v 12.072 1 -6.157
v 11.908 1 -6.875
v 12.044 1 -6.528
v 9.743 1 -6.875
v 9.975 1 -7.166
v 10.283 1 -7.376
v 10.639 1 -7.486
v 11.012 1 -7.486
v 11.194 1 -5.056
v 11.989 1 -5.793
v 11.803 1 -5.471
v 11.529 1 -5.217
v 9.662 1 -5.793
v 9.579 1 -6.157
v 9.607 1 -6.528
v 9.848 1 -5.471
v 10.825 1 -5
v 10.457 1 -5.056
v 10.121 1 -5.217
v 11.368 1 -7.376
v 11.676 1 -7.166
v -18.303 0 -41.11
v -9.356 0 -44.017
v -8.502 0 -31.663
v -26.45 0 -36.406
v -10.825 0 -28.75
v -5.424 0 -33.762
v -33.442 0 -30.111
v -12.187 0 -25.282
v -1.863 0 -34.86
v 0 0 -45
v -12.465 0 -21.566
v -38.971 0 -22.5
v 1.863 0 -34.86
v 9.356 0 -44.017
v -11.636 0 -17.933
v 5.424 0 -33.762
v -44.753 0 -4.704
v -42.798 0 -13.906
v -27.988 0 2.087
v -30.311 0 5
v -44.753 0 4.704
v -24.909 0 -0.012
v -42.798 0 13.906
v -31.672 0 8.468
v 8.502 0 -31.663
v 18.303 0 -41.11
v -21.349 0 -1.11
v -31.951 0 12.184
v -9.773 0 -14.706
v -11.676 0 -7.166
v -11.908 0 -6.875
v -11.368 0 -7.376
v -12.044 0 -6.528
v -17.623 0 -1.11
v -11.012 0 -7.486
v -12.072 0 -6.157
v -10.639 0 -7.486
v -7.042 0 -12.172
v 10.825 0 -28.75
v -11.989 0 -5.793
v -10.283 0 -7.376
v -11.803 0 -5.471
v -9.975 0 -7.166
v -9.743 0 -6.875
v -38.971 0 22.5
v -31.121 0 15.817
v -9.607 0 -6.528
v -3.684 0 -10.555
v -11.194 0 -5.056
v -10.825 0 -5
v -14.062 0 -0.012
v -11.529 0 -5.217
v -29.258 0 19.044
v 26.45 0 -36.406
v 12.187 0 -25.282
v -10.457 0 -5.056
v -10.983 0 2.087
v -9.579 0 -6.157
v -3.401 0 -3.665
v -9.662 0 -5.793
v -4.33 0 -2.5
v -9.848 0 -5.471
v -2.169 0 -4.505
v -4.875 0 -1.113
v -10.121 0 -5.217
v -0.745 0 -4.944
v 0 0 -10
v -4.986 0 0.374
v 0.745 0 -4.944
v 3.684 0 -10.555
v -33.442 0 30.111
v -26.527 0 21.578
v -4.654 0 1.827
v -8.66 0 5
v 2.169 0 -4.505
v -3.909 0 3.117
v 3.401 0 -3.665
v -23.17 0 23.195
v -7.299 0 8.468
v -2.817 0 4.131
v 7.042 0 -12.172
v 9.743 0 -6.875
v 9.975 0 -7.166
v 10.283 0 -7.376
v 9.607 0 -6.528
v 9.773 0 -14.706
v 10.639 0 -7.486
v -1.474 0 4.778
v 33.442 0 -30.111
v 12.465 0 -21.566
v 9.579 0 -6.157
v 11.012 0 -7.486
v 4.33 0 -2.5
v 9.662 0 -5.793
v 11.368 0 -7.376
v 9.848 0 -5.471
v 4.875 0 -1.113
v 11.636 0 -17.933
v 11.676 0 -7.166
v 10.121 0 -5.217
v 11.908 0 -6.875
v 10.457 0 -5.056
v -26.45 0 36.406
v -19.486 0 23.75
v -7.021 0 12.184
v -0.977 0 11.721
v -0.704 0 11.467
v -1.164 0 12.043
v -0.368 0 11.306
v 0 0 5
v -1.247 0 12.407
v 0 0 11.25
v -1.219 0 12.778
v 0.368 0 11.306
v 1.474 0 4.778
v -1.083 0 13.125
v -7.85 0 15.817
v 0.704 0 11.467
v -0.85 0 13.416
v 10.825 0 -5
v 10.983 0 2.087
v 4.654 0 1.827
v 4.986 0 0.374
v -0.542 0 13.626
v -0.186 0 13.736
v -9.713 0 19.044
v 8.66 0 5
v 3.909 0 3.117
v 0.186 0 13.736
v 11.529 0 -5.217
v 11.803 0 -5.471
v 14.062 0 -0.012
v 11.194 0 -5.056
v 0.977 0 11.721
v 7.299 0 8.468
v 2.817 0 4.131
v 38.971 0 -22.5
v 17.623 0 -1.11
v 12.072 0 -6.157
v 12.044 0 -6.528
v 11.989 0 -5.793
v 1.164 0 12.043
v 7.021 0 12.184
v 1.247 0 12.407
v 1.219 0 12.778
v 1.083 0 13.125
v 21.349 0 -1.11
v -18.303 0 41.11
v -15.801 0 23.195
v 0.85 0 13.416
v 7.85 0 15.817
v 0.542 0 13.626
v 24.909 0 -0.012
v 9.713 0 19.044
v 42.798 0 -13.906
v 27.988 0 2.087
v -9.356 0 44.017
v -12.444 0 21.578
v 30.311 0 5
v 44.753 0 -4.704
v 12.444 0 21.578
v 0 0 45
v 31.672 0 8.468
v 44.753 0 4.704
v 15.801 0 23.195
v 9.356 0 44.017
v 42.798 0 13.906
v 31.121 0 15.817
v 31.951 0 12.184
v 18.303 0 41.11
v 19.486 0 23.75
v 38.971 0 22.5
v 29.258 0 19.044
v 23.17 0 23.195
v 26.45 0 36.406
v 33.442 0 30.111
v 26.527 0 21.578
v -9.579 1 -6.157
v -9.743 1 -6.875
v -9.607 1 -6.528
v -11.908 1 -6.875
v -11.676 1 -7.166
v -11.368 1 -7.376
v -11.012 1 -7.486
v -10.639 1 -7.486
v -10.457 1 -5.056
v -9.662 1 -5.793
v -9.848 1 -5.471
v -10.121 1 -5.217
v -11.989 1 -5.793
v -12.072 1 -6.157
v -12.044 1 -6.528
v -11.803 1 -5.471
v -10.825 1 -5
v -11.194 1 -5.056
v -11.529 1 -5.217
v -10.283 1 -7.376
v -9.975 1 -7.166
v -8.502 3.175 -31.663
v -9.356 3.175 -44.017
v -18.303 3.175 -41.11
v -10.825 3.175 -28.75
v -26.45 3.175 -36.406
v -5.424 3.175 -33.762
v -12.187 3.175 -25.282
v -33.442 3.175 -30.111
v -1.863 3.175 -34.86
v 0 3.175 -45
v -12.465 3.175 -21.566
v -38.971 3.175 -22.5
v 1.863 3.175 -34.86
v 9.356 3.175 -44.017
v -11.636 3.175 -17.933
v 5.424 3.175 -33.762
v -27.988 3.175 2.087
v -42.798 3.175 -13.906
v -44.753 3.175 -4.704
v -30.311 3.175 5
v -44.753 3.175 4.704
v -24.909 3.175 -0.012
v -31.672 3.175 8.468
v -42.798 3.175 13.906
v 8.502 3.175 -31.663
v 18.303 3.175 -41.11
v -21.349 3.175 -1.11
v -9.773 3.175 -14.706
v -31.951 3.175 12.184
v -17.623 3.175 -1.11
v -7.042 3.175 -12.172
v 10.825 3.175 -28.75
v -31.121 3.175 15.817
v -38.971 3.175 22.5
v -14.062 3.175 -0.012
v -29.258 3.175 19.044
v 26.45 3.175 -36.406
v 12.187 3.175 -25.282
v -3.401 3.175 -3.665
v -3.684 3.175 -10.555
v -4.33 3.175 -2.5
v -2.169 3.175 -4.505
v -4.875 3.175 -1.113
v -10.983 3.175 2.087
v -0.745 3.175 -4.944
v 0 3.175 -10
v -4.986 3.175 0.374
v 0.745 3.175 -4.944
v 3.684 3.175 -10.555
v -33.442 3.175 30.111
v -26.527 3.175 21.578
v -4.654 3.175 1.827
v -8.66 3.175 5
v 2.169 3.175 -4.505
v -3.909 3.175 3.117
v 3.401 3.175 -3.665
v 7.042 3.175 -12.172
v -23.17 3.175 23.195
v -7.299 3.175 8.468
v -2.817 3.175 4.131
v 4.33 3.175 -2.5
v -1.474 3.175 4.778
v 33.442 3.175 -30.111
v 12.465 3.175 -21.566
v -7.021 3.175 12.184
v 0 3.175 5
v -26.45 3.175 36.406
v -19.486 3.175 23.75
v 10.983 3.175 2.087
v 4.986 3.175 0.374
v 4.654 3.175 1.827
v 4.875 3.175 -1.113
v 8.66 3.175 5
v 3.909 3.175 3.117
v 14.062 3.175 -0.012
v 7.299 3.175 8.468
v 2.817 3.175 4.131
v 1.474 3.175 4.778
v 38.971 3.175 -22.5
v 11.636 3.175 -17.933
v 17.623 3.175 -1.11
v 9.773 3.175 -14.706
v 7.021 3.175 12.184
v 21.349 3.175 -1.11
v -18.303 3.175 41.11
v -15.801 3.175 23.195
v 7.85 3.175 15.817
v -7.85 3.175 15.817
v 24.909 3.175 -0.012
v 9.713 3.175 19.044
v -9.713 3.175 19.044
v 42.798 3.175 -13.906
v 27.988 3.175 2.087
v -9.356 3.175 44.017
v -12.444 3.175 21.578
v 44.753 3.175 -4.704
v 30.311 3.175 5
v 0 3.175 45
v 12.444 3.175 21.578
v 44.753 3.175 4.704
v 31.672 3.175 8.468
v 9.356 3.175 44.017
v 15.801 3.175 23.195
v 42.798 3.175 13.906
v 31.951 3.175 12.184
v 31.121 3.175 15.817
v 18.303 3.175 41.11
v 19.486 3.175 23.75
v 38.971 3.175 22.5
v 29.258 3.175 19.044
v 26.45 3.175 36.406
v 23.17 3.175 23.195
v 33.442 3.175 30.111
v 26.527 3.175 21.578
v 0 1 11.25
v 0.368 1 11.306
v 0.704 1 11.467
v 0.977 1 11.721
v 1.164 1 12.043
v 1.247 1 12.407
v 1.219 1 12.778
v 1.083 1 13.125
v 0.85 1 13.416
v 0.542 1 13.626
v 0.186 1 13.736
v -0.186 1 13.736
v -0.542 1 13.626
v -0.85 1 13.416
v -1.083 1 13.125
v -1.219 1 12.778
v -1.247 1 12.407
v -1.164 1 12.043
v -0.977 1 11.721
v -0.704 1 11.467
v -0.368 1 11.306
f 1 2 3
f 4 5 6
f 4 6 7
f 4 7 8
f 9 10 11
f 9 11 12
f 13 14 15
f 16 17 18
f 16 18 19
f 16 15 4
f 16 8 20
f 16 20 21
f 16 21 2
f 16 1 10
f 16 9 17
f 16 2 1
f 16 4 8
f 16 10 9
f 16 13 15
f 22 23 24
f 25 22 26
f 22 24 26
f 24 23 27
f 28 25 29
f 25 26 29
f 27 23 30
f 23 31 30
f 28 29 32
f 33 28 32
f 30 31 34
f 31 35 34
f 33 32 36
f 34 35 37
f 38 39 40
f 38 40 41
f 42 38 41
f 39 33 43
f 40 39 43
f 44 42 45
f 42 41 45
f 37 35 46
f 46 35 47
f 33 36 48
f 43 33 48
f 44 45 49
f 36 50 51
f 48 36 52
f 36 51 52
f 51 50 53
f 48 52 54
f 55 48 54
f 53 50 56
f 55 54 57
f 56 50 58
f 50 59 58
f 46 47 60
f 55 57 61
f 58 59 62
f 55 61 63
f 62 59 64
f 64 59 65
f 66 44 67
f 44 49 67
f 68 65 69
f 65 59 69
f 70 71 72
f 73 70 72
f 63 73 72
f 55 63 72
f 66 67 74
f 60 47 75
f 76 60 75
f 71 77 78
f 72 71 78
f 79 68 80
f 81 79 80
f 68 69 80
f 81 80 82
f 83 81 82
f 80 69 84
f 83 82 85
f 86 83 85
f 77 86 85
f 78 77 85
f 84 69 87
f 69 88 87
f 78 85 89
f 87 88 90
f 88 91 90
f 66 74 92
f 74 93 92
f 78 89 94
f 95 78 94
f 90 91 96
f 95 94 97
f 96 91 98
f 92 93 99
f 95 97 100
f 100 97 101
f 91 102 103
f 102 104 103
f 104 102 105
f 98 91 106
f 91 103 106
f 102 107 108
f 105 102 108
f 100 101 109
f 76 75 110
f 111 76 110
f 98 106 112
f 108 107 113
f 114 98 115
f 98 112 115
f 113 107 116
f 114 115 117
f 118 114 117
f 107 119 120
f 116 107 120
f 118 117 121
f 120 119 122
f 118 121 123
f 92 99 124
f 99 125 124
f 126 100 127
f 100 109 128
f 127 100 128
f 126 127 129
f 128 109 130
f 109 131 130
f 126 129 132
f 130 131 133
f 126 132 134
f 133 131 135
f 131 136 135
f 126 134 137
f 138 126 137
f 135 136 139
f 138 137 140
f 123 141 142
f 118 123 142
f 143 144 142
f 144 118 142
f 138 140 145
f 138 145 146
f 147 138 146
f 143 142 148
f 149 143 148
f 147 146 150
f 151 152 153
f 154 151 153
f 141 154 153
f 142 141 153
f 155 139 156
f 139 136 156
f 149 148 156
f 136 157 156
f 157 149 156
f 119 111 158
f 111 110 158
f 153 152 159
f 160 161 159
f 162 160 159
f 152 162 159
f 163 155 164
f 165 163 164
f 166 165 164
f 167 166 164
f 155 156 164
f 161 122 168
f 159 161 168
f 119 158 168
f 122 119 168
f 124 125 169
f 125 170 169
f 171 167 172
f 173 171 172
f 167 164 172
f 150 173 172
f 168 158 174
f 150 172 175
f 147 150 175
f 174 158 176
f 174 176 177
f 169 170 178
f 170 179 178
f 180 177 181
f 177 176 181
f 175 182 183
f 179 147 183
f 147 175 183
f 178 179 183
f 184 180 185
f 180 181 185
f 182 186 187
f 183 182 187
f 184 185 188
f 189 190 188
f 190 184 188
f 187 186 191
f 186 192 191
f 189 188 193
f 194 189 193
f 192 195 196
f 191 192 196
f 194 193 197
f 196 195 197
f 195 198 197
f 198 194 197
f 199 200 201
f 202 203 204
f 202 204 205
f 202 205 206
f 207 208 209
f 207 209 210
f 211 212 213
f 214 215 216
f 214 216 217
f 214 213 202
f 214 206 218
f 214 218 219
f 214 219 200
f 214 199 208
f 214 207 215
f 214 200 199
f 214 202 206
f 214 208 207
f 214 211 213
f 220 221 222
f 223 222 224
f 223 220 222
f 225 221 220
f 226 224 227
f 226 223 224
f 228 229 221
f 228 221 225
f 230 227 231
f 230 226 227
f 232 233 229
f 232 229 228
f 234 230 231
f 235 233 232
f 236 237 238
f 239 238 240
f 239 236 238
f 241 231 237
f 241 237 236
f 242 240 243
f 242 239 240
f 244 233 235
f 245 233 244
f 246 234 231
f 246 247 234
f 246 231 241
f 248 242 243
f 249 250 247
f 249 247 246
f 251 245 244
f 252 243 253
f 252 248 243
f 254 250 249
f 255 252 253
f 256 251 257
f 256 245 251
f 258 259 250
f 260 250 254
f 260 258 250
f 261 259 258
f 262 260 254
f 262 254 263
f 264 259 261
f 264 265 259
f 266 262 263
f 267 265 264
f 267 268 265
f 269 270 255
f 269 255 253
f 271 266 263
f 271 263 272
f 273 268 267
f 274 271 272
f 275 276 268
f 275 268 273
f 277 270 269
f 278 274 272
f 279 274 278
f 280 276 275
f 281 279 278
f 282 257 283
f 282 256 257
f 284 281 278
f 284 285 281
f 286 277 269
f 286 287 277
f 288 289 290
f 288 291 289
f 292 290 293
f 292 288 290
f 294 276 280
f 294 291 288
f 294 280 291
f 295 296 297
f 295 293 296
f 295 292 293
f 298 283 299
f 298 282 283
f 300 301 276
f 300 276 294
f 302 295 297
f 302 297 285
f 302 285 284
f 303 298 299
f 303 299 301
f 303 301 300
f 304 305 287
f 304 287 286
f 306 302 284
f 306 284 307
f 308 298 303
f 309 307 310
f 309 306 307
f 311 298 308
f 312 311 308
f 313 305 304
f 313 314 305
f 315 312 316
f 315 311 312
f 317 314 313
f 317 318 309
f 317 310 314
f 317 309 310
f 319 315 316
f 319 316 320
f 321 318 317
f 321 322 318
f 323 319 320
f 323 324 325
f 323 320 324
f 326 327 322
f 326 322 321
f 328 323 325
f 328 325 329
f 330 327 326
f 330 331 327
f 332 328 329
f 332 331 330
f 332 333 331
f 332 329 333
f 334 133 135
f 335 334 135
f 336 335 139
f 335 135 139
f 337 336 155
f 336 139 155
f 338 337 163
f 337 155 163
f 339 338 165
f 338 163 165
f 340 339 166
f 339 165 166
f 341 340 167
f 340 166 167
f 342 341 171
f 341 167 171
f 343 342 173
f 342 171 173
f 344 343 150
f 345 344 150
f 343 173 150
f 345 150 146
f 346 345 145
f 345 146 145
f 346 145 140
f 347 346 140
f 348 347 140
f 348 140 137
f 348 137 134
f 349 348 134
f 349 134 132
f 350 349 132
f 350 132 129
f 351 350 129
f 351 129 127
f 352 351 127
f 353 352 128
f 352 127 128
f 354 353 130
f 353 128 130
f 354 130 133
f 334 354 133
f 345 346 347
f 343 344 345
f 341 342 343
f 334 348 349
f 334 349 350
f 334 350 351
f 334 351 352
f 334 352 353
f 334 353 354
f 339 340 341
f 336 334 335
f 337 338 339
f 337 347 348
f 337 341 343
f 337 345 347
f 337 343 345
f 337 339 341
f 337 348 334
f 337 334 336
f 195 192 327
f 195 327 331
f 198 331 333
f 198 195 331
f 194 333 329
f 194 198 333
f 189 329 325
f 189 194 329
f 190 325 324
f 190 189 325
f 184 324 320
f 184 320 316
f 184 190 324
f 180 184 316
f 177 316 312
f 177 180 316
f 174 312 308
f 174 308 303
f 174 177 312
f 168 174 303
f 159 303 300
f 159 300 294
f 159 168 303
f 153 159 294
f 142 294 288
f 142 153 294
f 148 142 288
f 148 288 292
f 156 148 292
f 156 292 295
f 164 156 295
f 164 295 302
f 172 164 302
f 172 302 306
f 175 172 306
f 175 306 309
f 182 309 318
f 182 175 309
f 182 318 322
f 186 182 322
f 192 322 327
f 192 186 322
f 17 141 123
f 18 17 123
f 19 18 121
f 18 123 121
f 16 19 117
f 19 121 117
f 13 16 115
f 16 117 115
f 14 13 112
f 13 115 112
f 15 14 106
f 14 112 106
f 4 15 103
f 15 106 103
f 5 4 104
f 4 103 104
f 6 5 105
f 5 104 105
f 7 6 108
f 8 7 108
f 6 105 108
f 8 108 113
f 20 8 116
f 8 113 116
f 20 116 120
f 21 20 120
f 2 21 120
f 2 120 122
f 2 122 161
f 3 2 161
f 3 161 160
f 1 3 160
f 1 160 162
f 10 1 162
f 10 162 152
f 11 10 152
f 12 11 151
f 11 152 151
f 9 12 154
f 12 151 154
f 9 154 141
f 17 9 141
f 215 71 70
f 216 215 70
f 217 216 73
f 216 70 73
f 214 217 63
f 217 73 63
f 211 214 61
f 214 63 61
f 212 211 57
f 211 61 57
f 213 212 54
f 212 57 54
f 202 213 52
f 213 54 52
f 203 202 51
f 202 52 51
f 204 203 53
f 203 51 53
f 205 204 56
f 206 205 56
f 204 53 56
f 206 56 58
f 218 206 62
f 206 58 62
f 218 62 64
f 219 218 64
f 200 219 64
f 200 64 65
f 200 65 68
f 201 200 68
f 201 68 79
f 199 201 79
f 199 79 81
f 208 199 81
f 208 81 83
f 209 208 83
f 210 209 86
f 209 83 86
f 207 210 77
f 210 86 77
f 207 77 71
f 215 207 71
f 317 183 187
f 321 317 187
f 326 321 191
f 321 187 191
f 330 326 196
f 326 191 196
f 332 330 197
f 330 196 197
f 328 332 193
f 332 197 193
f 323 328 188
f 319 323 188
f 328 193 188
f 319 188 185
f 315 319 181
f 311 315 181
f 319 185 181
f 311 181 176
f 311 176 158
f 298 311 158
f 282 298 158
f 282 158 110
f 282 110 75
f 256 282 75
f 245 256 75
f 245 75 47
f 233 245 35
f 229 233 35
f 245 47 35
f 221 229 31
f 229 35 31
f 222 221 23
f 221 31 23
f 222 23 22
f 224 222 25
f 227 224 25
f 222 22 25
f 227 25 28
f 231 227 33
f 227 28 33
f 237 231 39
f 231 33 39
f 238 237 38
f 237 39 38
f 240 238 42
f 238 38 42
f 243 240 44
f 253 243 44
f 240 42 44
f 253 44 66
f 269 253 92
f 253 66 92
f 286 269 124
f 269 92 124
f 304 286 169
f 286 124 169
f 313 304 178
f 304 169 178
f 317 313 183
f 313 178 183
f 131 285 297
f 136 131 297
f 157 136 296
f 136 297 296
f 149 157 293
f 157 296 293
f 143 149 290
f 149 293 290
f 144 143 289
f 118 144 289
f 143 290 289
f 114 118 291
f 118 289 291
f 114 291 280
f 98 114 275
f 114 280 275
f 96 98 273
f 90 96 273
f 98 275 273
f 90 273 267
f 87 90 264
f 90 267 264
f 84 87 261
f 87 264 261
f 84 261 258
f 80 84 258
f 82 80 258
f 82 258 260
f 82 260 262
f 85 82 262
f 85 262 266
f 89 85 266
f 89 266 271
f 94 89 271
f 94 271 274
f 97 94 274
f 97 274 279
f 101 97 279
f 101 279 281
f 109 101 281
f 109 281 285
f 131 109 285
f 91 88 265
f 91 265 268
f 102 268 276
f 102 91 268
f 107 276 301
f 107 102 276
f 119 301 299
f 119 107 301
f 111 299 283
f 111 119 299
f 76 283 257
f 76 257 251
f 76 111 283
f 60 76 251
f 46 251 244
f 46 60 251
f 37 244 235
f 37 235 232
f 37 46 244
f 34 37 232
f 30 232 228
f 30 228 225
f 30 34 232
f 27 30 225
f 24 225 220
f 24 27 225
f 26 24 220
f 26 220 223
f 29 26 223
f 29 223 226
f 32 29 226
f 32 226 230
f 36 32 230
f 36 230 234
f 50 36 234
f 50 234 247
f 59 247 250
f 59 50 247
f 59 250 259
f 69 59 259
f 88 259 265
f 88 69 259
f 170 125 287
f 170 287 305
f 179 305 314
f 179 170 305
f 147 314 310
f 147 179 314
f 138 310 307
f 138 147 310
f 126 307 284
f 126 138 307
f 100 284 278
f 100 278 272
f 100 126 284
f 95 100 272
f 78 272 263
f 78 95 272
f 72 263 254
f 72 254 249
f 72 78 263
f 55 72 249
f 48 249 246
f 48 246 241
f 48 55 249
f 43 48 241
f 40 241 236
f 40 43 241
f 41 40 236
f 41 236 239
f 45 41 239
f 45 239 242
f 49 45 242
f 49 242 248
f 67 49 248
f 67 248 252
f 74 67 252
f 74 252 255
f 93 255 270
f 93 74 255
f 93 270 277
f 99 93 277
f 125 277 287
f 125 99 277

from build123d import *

# Parameters (mm, degrees)
SKETCH1_R           = 45
SKETCH1_R_2         = 12.5
BOSS_EXTRUDE1_DEPTH = 3.175
SKETCH3_R           = 5
CUT_EXTRUDE1_DEPTH  = 6.35
SKETCH4_R           = 1.25
CUT_EXTRUDE2_DEPTH  = 1


with BuildPart() as part:
    # Sketch1 → Boss-Extrude1 (new body)
    with BuildSketch(Plane(origin=(0, 0, 0), x_dir=(1, 0, 0), z_dir=(0, 1, 0))):
        with Locations(Location((0, 0, 0), (0, 0, 270))):
            Circle(SKETCH1_R)
        with Locations(Location((0, 22.5, 0), (0, 0, 270))):
            Circle(SKETCH1_R_2, mode=Mode.SUBTRACT)
        with Locations(Location((19.485571585, -11.25, 0), (0, 0, 270))):
            Circle(SKETCH1_R_2, mode=Mode.SUBTRACT)
        with Locations(Location((-19.485571585, -11.25, 0), (0, 0, 270))):
            Circle(SKETCH1_R_2, mode=Mode.SUBTRACT)
    extrude(amount=BOSS_EXTRUDE1_DEPTH)

    # Sketch3 → Cut-Extrude1 (cut)
    with BuildSketch(Plane(origin=(0, 3.175, 0), x_dir=(1, 0, 0), z_dir=(0, 1, 0))):
        with Locations(Location((0, 0, 0), (0, 0, 270))):
            Circle(SKETCH3_R)
    extrude(amount=-CUT_EXTRUDE1_DEPTH, mode=Mode.SUBTRACT)

    # Sketch4 → Cut-Extrude2 (cut)
    with BuildSketch(Plane.XZ):
        with Locations(Location((0, 12.5, 0), (0, 0, 270))):
            Circle(SKETCH4_R)
        with Locations(Location((10.825317547, -6.25, 0), (0, 0, 90))):
            Circle(SKETCH4_R)
        with Locations(Location((-10.825317547, -6.25, 0), (0, 0, 90))):
            Circle(SKETCH4_R)
    extrude(amount=-CUT_EXTRUDE2_DEPTH, mode=Mode.SUBTRACT)


solid = part.part
